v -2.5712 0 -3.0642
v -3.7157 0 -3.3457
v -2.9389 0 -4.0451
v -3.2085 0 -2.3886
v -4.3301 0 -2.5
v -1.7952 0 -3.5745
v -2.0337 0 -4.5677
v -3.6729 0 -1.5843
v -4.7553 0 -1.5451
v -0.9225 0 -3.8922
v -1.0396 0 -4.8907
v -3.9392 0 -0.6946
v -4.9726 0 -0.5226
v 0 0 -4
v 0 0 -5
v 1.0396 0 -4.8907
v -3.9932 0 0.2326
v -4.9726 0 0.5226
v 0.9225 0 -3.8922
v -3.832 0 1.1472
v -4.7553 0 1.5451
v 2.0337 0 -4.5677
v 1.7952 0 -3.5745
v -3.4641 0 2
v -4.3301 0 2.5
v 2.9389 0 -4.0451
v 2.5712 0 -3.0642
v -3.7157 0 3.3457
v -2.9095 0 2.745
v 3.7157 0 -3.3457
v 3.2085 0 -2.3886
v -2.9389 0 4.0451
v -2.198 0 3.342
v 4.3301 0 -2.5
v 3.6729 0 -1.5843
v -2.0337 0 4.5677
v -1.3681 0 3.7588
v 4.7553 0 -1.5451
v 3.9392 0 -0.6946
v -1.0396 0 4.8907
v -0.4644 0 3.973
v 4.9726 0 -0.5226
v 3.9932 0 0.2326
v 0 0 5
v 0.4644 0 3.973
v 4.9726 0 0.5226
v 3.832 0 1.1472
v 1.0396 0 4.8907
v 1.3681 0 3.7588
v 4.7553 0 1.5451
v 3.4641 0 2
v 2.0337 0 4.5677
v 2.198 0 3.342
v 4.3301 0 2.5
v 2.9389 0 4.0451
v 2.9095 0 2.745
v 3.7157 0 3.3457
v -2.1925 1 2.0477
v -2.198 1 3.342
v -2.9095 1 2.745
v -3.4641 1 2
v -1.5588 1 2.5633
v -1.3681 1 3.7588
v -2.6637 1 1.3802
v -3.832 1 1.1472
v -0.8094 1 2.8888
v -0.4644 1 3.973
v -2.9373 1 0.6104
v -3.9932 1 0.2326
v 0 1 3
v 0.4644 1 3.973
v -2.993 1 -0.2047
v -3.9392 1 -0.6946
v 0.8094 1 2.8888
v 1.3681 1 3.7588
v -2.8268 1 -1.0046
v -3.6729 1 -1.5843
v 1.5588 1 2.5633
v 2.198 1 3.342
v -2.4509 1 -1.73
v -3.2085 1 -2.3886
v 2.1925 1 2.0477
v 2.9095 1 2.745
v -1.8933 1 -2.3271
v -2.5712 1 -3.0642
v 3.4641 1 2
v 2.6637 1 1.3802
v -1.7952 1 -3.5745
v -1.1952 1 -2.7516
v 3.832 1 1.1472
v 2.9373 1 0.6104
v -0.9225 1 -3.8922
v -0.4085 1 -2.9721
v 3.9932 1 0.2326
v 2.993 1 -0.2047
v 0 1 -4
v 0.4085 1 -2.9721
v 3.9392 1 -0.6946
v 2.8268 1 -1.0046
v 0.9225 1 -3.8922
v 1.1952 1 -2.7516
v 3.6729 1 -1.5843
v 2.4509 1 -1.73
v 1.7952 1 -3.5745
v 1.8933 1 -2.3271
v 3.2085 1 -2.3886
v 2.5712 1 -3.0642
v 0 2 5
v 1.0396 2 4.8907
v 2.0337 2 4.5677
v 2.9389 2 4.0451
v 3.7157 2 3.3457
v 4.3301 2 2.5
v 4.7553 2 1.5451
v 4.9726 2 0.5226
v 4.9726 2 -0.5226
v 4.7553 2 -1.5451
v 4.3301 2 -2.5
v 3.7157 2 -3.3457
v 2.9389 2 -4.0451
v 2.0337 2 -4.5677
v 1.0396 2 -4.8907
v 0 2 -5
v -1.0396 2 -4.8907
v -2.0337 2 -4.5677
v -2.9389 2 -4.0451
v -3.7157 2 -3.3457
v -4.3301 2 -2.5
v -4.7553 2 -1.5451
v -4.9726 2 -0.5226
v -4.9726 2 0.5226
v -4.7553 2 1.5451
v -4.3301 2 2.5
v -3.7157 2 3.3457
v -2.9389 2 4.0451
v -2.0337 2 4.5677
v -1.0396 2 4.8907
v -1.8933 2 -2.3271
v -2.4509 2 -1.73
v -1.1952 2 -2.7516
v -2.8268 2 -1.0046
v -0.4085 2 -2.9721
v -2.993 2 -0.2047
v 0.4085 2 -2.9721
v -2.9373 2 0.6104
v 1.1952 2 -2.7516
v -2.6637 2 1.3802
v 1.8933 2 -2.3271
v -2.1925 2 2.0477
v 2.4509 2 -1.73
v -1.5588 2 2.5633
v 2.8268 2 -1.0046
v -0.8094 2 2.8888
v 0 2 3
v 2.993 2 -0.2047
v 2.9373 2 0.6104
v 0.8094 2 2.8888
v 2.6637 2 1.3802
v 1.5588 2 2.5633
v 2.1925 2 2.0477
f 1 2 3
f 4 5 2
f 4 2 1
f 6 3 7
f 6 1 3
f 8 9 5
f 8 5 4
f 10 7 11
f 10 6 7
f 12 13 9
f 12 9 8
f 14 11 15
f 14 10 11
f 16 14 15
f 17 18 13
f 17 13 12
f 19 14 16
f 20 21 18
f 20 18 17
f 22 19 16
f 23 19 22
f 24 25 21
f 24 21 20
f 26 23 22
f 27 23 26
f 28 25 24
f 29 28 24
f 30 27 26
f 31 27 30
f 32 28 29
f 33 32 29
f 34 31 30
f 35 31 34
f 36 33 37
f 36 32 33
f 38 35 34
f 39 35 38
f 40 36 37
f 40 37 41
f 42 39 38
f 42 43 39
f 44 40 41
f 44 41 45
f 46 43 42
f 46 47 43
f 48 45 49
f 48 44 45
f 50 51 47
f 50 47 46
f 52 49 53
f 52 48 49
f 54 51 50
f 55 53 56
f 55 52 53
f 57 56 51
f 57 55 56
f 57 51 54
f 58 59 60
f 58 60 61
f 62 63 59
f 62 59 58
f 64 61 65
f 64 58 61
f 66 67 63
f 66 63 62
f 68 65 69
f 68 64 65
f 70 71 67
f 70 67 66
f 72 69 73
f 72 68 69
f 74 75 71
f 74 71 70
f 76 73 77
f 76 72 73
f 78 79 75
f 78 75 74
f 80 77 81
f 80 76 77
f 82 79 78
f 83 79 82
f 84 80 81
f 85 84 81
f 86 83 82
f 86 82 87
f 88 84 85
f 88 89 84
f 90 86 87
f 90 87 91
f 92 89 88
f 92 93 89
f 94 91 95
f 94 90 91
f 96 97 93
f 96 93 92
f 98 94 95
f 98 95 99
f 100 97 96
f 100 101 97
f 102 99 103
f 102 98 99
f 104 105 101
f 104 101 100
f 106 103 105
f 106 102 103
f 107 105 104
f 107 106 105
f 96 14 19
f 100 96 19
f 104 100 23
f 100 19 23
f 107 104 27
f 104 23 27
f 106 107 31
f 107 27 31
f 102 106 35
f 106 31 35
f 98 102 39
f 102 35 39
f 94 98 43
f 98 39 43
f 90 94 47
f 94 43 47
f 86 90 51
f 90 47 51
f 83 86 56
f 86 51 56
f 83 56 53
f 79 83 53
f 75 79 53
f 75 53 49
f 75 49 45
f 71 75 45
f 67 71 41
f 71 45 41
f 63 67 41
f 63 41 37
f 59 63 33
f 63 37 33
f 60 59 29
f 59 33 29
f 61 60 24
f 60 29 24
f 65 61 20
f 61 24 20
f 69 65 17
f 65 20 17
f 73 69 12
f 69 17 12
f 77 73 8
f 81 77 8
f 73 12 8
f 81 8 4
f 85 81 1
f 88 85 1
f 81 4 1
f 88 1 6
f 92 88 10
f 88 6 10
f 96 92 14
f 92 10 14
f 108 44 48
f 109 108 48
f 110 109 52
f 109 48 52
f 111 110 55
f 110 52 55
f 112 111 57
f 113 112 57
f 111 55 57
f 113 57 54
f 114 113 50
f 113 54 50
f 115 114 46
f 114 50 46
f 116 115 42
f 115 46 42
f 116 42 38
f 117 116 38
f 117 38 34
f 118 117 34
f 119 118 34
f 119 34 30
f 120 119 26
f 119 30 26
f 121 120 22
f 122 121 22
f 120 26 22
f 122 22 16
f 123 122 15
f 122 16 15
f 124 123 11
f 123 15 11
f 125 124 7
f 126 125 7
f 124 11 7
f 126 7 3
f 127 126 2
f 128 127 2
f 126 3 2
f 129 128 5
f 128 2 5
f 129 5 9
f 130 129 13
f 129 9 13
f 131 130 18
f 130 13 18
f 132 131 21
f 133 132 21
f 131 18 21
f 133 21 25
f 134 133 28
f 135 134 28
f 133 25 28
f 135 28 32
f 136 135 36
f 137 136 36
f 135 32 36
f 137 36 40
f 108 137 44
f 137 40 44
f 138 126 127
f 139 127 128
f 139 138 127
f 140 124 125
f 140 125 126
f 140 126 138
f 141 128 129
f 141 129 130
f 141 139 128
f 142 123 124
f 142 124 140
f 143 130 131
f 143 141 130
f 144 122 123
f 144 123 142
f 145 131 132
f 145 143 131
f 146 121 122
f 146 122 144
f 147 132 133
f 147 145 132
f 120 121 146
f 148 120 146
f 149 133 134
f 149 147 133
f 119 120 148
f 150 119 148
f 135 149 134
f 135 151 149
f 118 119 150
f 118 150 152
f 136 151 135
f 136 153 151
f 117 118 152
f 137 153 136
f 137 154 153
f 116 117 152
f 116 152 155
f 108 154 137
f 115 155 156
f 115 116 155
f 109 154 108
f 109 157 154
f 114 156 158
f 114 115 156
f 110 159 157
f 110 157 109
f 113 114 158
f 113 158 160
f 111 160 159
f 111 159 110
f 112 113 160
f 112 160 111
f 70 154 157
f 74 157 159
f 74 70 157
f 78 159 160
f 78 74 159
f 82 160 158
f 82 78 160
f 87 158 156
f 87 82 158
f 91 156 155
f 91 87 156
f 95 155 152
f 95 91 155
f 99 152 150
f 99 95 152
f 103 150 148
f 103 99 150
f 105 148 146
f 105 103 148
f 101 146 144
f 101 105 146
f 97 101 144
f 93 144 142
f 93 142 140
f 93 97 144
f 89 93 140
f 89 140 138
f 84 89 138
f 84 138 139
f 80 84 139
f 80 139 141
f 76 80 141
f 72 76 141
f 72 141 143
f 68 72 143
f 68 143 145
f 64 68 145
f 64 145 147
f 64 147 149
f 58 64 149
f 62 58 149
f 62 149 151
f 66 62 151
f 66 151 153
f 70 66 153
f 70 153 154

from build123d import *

# Parameters (mm, degrees)
SKETCH1_R           = 5
SKETCH1_R_2         = 4
BOSS_EXTRUDE1_DEPTH = 2
BOSS_EXTRUDE2_START = -1.9
SKETCH2_R           = 4
SKETCH2_R_2         = 3
BOSS_EXTRUDE2_DEPTH = 1.9
BOSS_EXTRUDE4_START = 0.1
SKETCH3_R           = 4
BOSS_EXTRUDE4_DEPTH = 0.1
SKETCH4_R           = 4
CUT_EXTRUDE1_DEPTH  = 1


with BuildPart() as part:
    # Sketch1 → Boss-Extrude1 (new body)
    with BuildSketch(Plane(origin=(0, 0, 0), x_dir=(1, 0, 0), z_dir=(0, 1, 0))):
        with Locations(Location((0, 0, 0), (0, 0, 270))):
            Circle(SKETCH1_R)
        with Locations(Location((0, 0, 0), (0, 0, 270))):
            Circle(SKETCH1_R_2, mode=Mode.SUBTRACT)
    extrude(amount=BOSS_EXTRUDE1_DEPTH)

    # Sketch2 → Boss-Extrude2 (add)
    with BuildSketch(Plane(origin=(0, 2, 0), x_dir=(1, 0, 0), z_dir=(0, 1, 0)).offset(BOSS_EXTRUDE2_START)):
        with Locations(Location((0, 0, 0), (0, 0, 270))):
            Circle(SKETCH2_R)
        with Locations(Location((0, 0, 0), (0, 0, 270))):
            Circle(SKETCH2_R_2, mode=Mode.SUBTRACT)
    extrude(amount=BOSS_EXTRUDE2_DEPTH)

    # Sketch3 → Boss-Extrude4 (add)
    with BuildSketch(Plane.XZ.offset(-0.1).offset(BOSS_EXTRUDE4_START)):
        Circle(SKETCH3_R)
    extrude(amount=-BOSS_EXTRUDE4_DEPTH)

    # Sketch4 → Cut-Extrude1 (cut)
    with BuildSketch(Plane.XZ):
        with Locations(Location((0, 0, 0), (0, 0, 270))):
            Circle(SKETCH4_R)
    extrude(amount=-CUT_EXTRUDE1_DEPTH, mode=Mode.SUBTRACT)


solid = part.part
